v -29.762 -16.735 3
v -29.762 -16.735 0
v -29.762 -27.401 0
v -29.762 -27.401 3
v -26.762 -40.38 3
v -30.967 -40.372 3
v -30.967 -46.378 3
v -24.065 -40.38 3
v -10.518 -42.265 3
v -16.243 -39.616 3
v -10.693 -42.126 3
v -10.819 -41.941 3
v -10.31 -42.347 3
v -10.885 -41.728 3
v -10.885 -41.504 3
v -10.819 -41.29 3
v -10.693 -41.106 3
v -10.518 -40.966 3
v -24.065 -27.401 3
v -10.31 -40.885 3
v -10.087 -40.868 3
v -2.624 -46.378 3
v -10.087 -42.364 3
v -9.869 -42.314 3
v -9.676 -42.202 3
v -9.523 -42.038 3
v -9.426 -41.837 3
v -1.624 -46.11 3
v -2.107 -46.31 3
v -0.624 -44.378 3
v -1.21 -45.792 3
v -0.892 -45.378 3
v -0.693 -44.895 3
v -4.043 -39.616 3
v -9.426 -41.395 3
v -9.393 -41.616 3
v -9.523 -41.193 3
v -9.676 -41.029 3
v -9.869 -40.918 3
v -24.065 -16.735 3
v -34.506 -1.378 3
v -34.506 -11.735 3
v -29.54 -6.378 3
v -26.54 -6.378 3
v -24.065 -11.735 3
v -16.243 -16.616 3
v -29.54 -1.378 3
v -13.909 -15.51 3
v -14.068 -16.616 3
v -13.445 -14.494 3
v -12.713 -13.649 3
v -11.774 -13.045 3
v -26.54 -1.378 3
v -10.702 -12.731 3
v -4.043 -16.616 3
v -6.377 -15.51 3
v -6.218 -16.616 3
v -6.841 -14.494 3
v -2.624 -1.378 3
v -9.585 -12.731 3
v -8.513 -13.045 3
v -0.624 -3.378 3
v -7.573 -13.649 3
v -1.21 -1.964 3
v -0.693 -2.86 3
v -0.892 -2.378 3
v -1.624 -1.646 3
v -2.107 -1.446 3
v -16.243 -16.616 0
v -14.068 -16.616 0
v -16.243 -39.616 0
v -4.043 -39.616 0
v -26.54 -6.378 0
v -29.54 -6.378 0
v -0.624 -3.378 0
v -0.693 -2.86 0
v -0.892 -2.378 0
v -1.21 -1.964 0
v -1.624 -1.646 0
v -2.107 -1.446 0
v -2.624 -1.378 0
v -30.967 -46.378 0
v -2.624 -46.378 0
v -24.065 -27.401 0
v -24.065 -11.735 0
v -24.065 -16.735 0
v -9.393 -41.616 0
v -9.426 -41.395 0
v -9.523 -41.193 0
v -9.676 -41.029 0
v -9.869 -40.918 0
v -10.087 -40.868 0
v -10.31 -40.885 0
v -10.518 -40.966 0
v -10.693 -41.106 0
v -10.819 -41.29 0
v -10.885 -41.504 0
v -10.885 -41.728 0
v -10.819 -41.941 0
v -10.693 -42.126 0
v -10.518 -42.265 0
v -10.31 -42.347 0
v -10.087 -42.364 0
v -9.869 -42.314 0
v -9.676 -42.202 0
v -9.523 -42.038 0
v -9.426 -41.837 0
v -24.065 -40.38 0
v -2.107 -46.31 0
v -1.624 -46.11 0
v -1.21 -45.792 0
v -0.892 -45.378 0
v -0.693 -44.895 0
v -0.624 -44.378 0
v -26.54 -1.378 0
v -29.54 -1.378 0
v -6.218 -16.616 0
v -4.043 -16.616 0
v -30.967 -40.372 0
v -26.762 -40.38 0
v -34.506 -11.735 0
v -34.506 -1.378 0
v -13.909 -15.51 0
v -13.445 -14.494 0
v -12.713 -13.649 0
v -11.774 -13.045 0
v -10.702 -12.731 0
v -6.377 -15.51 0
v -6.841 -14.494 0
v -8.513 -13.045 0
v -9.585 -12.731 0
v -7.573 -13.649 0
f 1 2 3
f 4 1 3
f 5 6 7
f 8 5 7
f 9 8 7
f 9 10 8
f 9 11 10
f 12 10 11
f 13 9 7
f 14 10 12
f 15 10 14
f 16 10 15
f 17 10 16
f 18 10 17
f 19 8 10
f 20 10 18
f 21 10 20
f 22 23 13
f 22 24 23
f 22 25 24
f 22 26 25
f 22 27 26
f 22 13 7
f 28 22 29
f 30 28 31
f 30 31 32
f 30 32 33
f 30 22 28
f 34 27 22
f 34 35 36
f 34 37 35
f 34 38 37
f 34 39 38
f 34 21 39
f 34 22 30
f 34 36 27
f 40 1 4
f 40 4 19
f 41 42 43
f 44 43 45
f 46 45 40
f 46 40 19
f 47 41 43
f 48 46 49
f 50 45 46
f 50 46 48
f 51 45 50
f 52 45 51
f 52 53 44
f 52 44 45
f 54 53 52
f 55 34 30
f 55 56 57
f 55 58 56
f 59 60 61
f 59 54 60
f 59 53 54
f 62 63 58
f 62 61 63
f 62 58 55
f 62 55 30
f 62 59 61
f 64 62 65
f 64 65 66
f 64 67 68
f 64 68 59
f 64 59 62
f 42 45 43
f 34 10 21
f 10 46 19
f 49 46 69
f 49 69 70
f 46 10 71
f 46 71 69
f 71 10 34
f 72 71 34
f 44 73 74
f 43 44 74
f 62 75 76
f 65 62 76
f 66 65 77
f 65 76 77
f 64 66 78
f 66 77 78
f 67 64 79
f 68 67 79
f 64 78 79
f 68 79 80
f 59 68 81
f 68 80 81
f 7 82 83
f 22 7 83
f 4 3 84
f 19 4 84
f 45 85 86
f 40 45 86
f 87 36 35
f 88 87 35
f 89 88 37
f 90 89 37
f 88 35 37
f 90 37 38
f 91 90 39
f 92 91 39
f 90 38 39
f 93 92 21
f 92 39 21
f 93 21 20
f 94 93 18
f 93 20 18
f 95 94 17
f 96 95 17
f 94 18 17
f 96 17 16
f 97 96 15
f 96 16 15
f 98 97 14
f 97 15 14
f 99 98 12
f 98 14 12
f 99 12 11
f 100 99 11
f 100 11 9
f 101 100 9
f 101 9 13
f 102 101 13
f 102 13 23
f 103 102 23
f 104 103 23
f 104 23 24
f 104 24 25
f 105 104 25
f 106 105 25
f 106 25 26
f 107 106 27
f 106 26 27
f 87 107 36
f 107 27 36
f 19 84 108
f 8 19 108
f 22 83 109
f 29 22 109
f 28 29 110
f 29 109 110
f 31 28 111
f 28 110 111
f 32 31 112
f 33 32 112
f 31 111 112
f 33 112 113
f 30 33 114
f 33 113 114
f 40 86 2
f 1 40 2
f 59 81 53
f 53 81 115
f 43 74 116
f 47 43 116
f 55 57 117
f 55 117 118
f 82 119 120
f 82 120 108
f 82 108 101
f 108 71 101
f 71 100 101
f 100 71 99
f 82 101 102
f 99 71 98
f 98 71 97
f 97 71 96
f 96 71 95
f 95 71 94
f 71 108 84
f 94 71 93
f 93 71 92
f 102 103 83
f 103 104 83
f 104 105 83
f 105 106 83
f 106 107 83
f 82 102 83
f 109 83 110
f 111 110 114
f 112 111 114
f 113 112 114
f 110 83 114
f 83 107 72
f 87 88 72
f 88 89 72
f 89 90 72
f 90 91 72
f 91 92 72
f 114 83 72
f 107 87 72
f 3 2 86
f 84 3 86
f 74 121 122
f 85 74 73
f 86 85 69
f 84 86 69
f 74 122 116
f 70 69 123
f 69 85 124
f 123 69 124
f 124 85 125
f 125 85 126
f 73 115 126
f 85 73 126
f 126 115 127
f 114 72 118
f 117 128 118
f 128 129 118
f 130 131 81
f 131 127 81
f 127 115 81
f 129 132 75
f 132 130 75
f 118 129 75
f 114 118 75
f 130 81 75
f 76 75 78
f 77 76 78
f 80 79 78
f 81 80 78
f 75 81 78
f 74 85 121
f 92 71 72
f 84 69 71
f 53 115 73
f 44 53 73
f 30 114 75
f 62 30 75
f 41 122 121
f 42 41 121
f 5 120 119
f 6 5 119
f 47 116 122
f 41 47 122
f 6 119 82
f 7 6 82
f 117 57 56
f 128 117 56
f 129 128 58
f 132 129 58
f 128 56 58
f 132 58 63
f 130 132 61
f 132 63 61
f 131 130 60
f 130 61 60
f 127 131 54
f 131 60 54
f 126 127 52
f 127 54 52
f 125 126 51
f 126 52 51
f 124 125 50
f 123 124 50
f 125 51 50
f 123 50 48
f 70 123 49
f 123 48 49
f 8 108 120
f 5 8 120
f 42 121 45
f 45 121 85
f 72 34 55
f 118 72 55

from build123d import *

# Parameters (mm, degrees)
BOSS_EXTRUDE1_DEPTH = 3
SKETCH2_W           = 12.2
SKETCH2_H           = 23
CUT_EXTRUDE1_DEPTH  = 4
SKETCH5_R           = 3.925
SKETCH5_R_2         = 0.75
CUT_EXTRUDE2_DEPTH  = 3


with BuildPart() as part:
    # Sketch1 → Boss-Extrude1 (new body)
    with BuildSketch(Plane.XY):
        with BuildLine():
            Line((-29.761795946, -16.735008518), (-29.761795946, -27.401277683))
            Line((-29.761795946, -27.401277683), (-24.065046346, -27.401277683))
            Line((-24.065046346, -27.401277683), (-24.065046346, -40.380088331))
            Line((-24.065046346, -40.380088331), (-26.761795946, -40.380088331))
            Line((-26.761795946, -40.380088331), (-30.96655582, -40.372207157))
            Line((-30.96655582, -40.372207157), (-30.96655582, -46.377768313))
            Line((-30.96655582, -46.377768313), (-27.761795946, -46.377768313))
            Line((-27.761795946, -46.377768313), (-2.624484573, -46.377768313))
            ThreePointArc((-2.624484573, -46.377768313), (-1.210271011, -45.791981876), (-0.624484573, -44.377768313))
            Line((-0.624484573, -44.377768313), (-0.624484573, -3.377768313))
            ThreePointArc((-0.624484573, -3.377768313), (-1.210271011, -1.963554751), (-2.624484573, -1.377768313))
            Line((-2.624484573, -1.377768313), (-26.540138154, -1.377768313))
            Line((-26.540138154, -1.377768313), (-26.540138154, -6.377768313))
            Line((-26.540138154, -6.377768313), (-29.540138154, -6.377768313))
            Line((-29.540138154, -6.377768313), (-29.540138154, -1.377768313))
            Line((-29.540138154, -1.377768313), (-34.506351605, -1.377768313))
            Line((-34.506351605, -1.377768313), (-34.506351605, -11.735008518))
            Line((-34.506351605, -11.735008518), (-29.761795946, -11.735008518))
            Line((-29.761795946, -11.735008518), (-24.065046346, -11.735008518))
            Line((-24.065046346, -11.735008518), (-24.065046346, -16.735008518))
            Line((-24.065046346, -16.735008518), (-29.761795946, -16.735008518))
        make_face()
    extrude(amount=BOSS_EXTRUDE1_DEPTH)

    # Sketch2 → Cut-Extrude1 (cut, through all)
    with BuildSketch(Plane.XY.offset(3)):
        with Locations((-10.143120504, -28.115803741)):
            Rectangle(SKETCH2_W, SKETCH2_H)
    extrude(amount=-CUT_EXTRUDE1_DEPTH, mode=Mode.SUBTRACT)

    # Sketch5 → Cut-Extrude2 (cut)
    with BuildSketch(Plane.XY.offset(3)):
        with Locations((-10.143120504, -16.615803741)):
            Circle(SKETCH5_R)
        with Locations((-10.143120504, -41.615803741)):
            Circle(SKETCH5_R_2)
    extrude(amount=-CUT_EXTRUDE2_DEPTH, mode=Mode.SUBTRACT)


solid = part.part
